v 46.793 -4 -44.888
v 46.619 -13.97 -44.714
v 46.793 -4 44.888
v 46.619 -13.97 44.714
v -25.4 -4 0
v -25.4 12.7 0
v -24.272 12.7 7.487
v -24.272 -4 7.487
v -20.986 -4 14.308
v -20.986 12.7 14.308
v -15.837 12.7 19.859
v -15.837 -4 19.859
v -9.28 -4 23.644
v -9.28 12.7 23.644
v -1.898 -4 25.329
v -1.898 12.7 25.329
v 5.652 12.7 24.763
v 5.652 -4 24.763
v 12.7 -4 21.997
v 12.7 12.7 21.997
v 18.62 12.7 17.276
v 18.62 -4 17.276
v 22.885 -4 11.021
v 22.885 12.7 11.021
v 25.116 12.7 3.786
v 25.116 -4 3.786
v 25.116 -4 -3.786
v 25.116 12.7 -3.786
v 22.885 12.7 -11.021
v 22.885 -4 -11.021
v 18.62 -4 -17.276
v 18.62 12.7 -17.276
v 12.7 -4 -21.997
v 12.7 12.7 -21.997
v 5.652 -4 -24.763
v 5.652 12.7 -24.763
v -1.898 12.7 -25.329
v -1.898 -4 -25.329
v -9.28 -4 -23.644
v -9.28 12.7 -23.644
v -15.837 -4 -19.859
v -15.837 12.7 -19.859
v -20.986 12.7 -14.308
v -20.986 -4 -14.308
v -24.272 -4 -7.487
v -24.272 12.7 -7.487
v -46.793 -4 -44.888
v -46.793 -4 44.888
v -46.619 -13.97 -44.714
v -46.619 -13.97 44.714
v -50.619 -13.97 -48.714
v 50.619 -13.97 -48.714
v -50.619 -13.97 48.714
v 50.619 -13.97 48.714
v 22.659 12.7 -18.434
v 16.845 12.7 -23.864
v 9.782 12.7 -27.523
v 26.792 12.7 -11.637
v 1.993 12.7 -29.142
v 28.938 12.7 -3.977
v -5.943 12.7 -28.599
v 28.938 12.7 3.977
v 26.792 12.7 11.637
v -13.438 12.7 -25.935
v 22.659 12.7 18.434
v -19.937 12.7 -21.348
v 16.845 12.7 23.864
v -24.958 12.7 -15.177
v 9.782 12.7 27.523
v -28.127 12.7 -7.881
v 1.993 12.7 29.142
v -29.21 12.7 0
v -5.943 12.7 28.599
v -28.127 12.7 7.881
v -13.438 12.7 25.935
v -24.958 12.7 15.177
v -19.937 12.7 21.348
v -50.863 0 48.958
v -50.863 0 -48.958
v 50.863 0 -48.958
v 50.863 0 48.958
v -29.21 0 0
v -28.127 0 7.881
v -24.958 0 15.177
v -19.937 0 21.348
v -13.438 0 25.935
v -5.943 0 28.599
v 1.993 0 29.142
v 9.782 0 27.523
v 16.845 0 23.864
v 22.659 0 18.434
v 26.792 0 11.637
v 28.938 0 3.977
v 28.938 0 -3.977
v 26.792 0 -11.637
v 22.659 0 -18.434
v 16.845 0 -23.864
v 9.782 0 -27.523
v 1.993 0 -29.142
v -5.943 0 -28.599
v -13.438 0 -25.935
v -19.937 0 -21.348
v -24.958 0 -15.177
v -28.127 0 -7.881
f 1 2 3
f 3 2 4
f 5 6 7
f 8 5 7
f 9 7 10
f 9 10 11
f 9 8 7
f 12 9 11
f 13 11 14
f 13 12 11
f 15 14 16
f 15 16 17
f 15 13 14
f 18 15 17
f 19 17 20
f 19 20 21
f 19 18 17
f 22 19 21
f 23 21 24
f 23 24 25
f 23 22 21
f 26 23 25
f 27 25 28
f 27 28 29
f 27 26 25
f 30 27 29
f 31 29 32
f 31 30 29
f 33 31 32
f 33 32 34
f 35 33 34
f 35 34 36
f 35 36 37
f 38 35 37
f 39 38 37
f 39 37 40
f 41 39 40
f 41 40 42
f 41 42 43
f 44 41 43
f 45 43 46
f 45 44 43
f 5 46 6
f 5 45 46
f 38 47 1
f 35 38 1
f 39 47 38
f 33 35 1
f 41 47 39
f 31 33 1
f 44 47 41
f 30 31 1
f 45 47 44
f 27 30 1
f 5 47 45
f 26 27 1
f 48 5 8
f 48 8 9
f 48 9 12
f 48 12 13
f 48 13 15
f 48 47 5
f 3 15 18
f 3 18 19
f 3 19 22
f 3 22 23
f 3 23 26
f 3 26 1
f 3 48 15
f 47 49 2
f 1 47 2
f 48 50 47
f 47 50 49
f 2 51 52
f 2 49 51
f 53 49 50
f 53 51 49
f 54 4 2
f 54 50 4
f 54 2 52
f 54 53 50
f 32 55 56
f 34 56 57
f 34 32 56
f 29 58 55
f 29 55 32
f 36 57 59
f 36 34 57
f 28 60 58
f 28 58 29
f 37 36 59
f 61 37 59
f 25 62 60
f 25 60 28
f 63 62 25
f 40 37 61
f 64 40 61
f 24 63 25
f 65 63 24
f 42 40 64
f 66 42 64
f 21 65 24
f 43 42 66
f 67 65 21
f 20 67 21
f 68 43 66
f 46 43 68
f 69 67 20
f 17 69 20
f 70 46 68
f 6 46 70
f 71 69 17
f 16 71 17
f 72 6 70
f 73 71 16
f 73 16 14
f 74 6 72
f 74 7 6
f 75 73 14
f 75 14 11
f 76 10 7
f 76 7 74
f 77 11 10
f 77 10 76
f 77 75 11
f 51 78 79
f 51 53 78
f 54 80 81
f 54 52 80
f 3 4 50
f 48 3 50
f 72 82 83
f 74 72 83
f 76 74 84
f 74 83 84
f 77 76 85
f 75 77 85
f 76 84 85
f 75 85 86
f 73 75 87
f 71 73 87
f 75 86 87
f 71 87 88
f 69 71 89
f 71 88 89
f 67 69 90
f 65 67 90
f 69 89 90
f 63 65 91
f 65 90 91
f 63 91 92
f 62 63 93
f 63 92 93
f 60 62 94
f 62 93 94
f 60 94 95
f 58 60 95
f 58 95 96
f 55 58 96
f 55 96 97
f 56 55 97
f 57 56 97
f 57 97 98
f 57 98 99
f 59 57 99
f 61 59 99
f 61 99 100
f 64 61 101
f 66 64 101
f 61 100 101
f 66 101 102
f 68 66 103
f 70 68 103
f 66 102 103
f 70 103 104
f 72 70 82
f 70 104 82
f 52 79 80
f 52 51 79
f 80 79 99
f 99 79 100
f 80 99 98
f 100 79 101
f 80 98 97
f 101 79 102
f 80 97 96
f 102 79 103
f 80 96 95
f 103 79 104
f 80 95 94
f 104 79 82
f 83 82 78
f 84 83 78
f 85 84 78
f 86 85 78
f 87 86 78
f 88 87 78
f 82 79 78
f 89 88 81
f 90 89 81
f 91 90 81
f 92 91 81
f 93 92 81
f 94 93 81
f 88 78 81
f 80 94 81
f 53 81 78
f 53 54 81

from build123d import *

# Parameters (mm, degrees)
F0_W     = 101.726
F0_H     = 97.916
F0_W_2   = 93.726
F0_H_2   = 89.916
F1_DEPTH = 13.97
F1_TAPER = 1
F2_T     = -4
F3_R     = 29.21
F3_R_2   = 25.4
F4_DEPTH = 12.7
F5_DEPTH = 4


with BuildPart() as f1:
    # F0 (on Front) → F1 (new body)
    with BuildSketch(Plane.XZ):
        Rectangle(F0_W, F0_H)
        Rectangle(F0_W_2, F0_H_2, mode=Mode.SUBTRACT)
        Rectangle(F0_W_2, F0_H_2)
    extrude(amount=F1_DEPTH, taper=F1_TAPER)

    # F2
    f2_openings = [f1.faces().sort_by_distance(p)[0] for p in [
        (0, -13.97, 0),
    ]]
    offset(amount=F2_T, openings=f2_openings)

    # F3 (on face) → F4 (join)
    with BuildSketch(Plane(origin=(0, 0, 0), x_dir=(-1, 0, 0), z_dir=(0, 1, 0))):
        Circle(F3_R)
        Circle(F3_R_2, mode=Mode.SUBTRACT)
    extrude(amount=F4_DEPTH)

    # F5 (cut, through all): a face of the model
    f5_faces = [f1.faces().sort_by_distance(p)[0] for p in [
        (0, 0, 0),
    ]]
    extrude(f5_faces, amount=-F5_DEPTH, mode=Mode.SUBTRACT)


solid = f1.part
